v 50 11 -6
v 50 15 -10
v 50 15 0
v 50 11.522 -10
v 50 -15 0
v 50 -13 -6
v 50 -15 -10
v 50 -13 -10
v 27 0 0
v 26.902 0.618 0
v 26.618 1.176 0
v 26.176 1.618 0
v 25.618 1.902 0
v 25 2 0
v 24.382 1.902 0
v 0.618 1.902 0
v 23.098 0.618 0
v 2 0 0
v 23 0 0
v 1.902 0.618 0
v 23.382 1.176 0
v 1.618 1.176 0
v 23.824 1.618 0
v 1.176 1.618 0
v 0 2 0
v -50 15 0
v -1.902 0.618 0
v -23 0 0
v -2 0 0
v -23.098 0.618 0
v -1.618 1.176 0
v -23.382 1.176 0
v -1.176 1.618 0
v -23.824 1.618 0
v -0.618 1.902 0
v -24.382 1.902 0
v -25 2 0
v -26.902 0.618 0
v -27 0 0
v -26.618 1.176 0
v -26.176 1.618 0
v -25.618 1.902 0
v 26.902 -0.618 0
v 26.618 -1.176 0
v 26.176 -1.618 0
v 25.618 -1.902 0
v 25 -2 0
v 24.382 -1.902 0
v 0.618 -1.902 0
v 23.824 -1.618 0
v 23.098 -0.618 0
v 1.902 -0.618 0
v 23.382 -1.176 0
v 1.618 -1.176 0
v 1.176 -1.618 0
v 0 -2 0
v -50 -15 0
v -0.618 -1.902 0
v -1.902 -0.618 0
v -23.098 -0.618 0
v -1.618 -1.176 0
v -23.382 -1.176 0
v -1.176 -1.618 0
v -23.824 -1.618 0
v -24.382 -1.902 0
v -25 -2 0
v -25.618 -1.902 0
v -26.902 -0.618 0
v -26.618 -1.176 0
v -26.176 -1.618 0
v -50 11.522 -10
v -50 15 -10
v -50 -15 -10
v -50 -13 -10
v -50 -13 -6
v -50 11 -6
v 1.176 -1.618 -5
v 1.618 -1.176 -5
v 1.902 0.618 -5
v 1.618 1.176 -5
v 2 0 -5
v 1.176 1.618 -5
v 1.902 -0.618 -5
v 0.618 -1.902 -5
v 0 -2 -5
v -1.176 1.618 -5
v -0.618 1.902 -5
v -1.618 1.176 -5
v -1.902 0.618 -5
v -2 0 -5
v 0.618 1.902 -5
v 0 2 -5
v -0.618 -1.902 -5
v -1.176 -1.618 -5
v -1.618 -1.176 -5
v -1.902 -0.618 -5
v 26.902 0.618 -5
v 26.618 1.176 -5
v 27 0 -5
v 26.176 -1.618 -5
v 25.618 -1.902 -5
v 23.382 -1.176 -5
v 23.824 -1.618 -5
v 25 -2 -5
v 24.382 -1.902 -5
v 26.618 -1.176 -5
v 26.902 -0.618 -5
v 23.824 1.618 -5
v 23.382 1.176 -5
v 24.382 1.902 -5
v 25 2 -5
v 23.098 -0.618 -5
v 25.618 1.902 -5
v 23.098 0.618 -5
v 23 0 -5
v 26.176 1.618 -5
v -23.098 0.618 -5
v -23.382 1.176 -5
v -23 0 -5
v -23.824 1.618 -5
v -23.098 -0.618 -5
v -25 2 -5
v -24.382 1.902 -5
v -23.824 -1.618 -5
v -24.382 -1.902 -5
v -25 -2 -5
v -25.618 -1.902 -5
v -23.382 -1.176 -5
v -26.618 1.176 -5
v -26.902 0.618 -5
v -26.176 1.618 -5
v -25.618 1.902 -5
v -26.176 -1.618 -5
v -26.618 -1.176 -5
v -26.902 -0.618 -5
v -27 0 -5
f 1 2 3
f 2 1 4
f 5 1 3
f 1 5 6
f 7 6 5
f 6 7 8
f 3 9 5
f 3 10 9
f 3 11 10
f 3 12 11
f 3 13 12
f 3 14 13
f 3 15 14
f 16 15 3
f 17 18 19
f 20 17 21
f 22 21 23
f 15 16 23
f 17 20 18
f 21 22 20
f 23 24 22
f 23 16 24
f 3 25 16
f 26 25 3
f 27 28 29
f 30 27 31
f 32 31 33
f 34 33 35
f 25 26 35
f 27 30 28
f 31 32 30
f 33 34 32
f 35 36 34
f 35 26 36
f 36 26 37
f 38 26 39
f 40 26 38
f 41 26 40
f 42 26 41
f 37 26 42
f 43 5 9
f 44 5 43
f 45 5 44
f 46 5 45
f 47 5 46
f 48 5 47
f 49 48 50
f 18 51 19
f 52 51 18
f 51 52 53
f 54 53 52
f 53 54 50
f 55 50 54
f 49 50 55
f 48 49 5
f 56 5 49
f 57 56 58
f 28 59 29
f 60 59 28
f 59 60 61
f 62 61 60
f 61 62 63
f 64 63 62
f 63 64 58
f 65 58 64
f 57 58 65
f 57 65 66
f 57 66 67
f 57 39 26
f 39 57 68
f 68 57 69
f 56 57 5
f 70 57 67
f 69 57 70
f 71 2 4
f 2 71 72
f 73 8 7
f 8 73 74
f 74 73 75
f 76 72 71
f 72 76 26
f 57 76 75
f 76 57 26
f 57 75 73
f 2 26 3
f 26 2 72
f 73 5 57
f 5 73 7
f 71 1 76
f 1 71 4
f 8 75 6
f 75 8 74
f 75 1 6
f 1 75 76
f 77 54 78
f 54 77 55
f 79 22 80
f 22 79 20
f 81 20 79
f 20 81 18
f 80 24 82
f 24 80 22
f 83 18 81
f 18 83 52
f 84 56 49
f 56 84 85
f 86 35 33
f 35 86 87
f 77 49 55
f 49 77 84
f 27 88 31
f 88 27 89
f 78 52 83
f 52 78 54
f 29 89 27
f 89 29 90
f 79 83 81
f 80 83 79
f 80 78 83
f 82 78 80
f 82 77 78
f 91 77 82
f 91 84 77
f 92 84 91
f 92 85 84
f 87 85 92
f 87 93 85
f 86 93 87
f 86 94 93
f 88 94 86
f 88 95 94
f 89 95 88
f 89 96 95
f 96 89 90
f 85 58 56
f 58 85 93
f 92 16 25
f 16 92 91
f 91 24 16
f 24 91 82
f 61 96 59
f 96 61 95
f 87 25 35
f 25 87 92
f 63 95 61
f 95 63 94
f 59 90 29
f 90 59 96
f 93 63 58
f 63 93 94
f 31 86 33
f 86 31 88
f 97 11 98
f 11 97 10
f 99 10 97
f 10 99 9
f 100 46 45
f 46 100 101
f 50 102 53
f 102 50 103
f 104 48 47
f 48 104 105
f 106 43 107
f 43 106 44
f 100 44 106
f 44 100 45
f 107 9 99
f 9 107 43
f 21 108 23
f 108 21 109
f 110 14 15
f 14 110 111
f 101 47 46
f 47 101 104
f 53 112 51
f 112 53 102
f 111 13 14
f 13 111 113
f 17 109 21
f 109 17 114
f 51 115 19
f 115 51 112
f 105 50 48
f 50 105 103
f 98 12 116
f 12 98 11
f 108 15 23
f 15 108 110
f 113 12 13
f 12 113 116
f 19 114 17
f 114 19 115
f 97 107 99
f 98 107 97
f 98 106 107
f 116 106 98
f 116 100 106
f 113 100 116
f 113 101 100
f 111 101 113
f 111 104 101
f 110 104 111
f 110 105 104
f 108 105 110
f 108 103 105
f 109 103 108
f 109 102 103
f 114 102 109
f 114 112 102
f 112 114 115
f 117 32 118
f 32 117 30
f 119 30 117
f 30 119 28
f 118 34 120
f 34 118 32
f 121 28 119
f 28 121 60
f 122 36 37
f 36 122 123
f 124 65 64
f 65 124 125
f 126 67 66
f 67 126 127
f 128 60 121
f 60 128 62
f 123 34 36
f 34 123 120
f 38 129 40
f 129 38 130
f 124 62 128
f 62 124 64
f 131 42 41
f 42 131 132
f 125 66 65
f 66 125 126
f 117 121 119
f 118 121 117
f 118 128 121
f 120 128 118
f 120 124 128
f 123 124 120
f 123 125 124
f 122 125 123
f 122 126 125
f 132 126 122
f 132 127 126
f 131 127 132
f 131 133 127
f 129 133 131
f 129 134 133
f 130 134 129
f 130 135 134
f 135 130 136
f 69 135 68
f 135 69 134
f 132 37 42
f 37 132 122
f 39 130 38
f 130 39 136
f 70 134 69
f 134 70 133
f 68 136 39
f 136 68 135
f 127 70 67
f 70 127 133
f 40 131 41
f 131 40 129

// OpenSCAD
d=30;
t=24;
b=27;
h=23;
z=-(h-4);
y=2;
w=100;

difference(){
    union() {
        translate([-w/2, -d/2, -10]) difference(){
            cube([w, d, 10]);
            //translate([2, -5, 12]) cube([w-2*2, d+10, 5]);
            translate([-2, 0, 0])
                rotate([90, 0 ,90])
                    linear_extrude(height=w+2*2)
                        polygon([[y, z], [y, z+h], [y+t, z+h], [y+b, z]]);
        }
        //translate([50/2,0,0]) cylinder(h=5, r=2.9/2, center=true, $fn=20);
        //translate([-50/2,0,0]) cylinder(h=5, r=2.9/2, center=true, $fn=20);
    }
    cylinder(h=10, r=4/2, center=true, $fn=20);
    translate([50/2,0,0]) cylinder(h=10, r=4/2, center=true, $fn=20);
    translate([-50/2,0,0]) cylinder(h=10, r=4/2, center=true, $fn=20);
}
